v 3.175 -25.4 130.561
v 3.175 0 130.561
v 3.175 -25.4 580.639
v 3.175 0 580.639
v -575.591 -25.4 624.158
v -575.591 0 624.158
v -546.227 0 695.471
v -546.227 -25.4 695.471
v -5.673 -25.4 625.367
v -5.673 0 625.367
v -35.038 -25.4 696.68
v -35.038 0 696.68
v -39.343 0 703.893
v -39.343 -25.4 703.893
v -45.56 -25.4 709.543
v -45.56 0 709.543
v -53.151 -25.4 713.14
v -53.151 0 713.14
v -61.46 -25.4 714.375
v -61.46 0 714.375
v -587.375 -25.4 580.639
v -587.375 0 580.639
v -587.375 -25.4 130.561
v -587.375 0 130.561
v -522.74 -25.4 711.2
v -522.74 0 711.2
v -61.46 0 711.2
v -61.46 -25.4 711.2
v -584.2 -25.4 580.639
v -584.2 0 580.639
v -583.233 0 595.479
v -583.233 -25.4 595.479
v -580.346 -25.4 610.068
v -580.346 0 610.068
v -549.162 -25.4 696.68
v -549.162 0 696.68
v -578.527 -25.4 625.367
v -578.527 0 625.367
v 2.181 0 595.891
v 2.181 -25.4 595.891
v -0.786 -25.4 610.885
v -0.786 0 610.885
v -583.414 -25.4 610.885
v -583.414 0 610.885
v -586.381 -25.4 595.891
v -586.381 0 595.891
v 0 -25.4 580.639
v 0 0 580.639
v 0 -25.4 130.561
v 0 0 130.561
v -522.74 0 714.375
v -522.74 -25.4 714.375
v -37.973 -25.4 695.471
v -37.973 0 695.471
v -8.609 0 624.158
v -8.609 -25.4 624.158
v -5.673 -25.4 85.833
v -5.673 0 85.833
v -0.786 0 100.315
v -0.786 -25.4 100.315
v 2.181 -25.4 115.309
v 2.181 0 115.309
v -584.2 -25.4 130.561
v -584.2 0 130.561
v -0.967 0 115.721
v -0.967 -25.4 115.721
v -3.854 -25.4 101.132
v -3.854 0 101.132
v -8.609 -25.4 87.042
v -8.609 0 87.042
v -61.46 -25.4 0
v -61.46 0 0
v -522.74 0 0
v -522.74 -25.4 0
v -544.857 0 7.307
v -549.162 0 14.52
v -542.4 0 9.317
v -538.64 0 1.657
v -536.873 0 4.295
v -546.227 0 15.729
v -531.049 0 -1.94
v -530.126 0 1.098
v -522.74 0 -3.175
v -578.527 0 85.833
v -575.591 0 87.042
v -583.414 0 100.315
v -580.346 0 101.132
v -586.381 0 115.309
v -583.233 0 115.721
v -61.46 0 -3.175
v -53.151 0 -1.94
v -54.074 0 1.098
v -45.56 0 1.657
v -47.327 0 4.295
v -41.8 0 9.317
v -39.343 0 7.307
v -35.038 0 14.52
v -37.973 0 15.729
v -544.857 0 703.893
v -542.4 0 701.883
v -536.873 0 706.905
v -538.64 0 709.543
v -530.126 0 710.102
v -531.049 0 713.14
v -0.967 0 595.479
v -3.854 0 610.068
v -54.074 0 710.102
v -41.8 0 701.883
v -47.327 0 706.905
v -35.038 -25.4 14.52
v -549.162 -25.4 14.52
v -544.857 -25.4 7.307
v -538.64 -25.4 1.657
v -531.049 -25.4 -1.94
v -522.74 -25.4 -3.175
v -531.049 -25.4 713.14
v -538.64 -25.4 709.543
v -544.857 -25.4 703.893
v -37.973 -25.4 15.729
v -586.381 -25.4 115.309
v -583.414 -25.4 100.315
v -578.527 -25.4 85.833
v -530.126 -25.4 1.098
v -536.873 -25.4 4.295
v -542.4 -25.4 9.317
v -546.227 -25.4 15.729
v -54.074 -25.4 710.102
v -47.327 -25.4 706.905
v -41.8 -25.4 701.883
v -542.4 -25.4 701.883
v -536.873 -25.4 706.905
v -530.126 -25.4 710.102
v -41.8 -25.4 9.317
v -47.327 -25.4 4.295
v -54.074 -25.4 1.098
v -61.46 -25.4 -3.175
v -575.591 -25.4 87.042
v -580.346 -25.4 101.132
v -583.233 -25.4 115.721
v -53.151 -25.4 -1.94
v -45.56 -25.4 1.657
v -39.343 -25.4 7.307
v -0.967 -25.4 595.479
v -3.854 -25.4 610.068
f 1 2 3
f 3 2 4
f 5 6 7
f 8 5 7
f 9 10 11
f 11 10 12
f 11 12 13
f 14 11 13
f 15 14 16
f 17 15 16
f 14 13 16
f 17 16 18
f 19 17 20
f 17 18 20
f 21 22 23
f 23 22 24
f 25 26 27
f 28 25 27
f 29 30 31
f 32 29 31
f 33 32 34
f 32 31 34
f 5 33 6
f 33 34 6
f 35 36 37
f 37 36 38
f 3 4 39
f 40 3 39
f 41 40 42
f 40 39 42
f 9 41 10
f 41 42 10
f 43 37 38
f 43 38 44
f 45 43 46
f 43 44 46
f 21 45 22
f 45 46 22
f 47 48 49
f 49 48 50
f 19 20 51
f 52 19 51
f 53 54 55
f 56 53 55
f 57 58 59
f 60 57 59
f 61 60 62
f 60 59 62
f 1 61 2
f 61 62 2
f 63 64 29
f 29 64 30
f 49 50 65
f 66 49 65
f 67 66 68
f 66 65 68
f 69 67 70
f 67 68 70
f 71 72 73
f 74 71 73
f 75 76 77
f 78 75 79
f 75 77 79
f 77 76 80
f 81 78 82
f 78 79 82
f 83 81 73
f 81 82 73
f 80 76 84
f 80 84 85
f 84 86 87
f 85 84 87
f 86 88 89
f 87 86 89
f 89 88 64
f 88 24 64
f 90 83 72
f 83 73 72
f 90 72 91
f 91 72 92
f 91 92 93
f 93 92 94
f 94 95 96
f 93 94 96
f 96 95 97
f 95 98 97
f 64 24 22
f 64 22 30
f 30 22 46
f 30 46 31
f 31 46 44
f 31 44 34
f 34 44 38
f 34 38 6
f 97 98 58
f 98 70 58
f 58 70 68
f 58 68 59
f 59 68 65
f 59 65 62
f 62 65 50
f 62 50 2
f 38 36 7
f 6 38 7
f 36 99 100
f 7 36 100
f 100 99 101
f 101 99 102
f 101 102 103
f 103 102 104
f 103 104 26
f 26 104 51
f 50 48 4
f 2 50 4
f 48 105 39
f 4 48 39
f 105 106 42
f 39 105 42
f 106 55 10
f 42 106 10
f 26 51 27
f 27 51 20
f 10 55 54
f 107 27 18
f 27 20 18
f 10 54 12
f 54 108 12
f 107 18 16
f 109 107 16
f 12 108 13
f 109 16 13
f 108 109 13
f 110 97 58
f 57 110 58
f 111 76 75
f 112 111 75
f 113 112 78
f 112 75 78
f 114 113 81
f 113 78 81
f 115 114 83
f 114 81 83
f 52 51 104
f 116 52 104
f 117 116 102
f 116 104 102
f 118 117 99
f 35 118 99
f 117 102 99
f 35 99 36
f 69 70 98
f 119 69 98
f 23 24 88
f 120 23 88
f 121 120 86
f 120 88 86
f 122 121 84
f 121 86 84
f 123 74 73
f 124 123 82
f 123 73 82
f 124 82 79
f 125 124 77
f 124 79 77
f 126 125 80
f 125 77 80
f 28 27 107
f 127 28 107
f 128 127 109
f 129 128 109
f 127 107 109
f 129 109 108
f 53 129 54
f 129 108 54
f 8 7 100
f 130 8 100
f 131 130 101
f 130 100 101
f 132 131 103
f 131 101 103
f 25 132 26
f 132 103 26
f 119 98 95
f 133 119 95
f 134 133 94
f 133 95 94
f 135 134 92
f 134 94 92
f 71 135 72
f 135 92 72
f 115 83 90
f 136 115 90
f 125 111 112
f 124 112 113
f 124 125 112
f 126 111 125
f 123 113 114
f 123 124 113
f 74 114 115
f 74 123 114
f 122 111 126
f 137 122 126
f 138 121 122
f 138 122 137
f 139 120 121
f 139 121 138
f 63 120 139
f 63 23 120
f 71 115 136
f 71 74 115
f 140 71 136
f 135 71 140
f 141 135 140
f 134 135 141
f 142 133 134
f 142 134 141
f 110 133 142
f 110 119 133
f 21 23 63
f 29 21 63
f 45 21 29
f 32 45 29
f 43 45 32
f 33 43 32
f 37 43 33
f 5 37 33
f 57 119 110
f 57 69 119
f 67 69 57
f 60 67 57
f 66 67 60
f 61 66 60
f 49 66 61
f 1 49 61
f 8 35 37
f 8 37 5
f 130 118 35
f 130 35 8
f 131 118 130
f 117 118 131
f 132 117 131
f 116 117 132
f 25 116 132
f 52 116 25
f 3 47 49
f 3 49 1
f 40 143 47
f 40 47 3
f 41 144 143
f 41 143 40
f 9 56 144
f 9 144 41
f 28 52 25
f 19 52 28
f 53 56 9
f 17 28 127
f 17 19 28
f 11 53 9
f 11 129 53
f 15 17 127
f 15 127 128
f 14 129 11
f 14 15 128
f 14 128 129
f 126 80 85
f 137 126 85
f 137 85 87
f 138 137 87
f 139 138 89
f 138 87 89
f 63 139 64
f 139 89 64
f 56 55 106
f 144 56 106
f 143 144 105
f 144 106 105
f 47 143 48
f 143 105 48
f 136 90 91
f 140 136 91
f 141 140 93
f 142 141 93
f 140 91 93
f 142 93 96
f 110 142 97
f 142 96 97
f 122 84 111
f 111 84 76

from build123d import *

# Parameters (mm, degrees)
F1_DEPTH = 25.4


with BuildPart() as f1:
    # F0 (on Front) → F1 (new body)
    with BuildSketch(Plane.XZ):
        with BuildLine():
            Line((-514.35, 714.375), (-522.739805, 714.375))
            ThreePointArc((-522.739805, 714.375), (-538.640068, 709.542625), (-549.162481, 696.679926))
            Line((-549.162481, 696.679926), (-578.52656, 625.367164))
            ThreePointArc((-578.52656, 625.367164), (-585.141661, 603.436284), (-587.375, 580.638581))
            Line((-587.375, 580.638581), (-587.375, 577.85))
            Line((-587.375, 577.85), (-587.375, 133.35))
            Line((-587.375, 133.35), (-587.375, 130.561419))
            ThreePointArc((-587.375, 130.561419), (-585.141661, 107.763716), (-578.52656, 85.832836))
            Line((-578.52656, 85.832836), (-549.162481, 14.520074))
            ThreePointArc((-549.162481, 14.520074), (-538.640068, 1.657375), (-522.739805, -3.175))
            Line((-522.739805, -3.175), (-514.35, -3.175))
            Line((-514.35, -3.175), (-69.85, -3.175))
            Line((-69.85, -3.175), (-61.460195, -3.175))
            ThreePointArc((-61.460195, -3.175), (-45.559932, 1.657375), (-35.037519, 14.520074))
            Line((-35.037519, 14.520074), (-5.67344, 85.832836))
            ThreePointArc((-5.67344, 85.832836), (0.941661, 107.763716), (3.175, 130.561419))
            Line((3.175, 130.561419), (3.175, 133.35))
            Line((3.175, 133.35), (3.175, 577.85))
            Line((3.175, 577.85), (3.175, 580.638581))
            ThreePointArc((3.175, 580.638581), (0.941661, 603.436284), (-5.67344, 625.367164))
            Line((-5.67344, 625.367164), (-35.037519, 696.679926))
            ThreePointArc((-35.037519, 696.679926), (-45.559932, 709.542625), (-61.460195, 714.375))
            Line((-61.460195, 714.375), (-69.85, 714.375))
            Line((-69.85, 714.375), (-514.35, 714.375))
        make_face()
        with BuildLine():
            Line((-522.739805, 711.2), (-514.35, 711.2))
            Line((-514.35, 711.2), (-69.85, 711.2))
            Line((-69.85, 711.2), (-61.460195, 711.2))
            ThreePointArc((-61.460195, 711.2), (-47.326628, 706.904556), (-37.973371, 695.471045))
            Line((-37.973371, 695.471045), (-8.609293, 624.158284))
            ThreePointArc((-8.609293, 624.158284), (-2.172979, 602.82013), (0, 580.638581))
            Line((0, 580.638581), (0, 577.85))
            Line((0, 577.85), (0, 133.35))
            Line((0, 133.35), (0, 130.561419))
            ThreePointArc((0, 130.561419), (-2.172979, 108.37987), (-8.609293, 87.041716))
            Line((-8.609293, 87.041716), (-37.973371, 15.728955))
            ThreePointArc((-37.973371, 15.728955), (-47.326628, 4.295444), (-61.460195, 0))
            Line((-61.460195, 0), (-69.85, 0))
            Line((-69.85, 0), (-514.35, 0))
            Line((-514.35, 0), (-522.739805, 0))
            ThreePointArc((-522.739805, 0), (-536.873372, 4.295444), (-546.226629, 15.728955))
            Line((-546.226629, 15.728955), (-575.590707, 87.041716))
            ThreePointArc((-575.590707, 87.041716), (-582.027021, 108.37987), (-584.2, 130.561419))
            Line((-584.2, 130.561419), (-584.2, 133.35))
            Line((-584.2, 133.35), (-584.2, 577.85))
            Line((-584.2, 577.85), (-584.2, 580.638581))
            ThreePointArc((-584.2, 580.638581), (-582.027021, 602.82013), (-575.590707, 624.158284))
            Line((-575.590707, 624.158284), (-546.226629, 695.471045))
            ThreePointArc((-546.226629, 695.471045), (-536.873372, 706.904556), (-522.739805, 711.2))
        make_face(mode=Mode.SUBTRACT)
    extrude(amount=F1_DEPTH)


solid = f1.part
